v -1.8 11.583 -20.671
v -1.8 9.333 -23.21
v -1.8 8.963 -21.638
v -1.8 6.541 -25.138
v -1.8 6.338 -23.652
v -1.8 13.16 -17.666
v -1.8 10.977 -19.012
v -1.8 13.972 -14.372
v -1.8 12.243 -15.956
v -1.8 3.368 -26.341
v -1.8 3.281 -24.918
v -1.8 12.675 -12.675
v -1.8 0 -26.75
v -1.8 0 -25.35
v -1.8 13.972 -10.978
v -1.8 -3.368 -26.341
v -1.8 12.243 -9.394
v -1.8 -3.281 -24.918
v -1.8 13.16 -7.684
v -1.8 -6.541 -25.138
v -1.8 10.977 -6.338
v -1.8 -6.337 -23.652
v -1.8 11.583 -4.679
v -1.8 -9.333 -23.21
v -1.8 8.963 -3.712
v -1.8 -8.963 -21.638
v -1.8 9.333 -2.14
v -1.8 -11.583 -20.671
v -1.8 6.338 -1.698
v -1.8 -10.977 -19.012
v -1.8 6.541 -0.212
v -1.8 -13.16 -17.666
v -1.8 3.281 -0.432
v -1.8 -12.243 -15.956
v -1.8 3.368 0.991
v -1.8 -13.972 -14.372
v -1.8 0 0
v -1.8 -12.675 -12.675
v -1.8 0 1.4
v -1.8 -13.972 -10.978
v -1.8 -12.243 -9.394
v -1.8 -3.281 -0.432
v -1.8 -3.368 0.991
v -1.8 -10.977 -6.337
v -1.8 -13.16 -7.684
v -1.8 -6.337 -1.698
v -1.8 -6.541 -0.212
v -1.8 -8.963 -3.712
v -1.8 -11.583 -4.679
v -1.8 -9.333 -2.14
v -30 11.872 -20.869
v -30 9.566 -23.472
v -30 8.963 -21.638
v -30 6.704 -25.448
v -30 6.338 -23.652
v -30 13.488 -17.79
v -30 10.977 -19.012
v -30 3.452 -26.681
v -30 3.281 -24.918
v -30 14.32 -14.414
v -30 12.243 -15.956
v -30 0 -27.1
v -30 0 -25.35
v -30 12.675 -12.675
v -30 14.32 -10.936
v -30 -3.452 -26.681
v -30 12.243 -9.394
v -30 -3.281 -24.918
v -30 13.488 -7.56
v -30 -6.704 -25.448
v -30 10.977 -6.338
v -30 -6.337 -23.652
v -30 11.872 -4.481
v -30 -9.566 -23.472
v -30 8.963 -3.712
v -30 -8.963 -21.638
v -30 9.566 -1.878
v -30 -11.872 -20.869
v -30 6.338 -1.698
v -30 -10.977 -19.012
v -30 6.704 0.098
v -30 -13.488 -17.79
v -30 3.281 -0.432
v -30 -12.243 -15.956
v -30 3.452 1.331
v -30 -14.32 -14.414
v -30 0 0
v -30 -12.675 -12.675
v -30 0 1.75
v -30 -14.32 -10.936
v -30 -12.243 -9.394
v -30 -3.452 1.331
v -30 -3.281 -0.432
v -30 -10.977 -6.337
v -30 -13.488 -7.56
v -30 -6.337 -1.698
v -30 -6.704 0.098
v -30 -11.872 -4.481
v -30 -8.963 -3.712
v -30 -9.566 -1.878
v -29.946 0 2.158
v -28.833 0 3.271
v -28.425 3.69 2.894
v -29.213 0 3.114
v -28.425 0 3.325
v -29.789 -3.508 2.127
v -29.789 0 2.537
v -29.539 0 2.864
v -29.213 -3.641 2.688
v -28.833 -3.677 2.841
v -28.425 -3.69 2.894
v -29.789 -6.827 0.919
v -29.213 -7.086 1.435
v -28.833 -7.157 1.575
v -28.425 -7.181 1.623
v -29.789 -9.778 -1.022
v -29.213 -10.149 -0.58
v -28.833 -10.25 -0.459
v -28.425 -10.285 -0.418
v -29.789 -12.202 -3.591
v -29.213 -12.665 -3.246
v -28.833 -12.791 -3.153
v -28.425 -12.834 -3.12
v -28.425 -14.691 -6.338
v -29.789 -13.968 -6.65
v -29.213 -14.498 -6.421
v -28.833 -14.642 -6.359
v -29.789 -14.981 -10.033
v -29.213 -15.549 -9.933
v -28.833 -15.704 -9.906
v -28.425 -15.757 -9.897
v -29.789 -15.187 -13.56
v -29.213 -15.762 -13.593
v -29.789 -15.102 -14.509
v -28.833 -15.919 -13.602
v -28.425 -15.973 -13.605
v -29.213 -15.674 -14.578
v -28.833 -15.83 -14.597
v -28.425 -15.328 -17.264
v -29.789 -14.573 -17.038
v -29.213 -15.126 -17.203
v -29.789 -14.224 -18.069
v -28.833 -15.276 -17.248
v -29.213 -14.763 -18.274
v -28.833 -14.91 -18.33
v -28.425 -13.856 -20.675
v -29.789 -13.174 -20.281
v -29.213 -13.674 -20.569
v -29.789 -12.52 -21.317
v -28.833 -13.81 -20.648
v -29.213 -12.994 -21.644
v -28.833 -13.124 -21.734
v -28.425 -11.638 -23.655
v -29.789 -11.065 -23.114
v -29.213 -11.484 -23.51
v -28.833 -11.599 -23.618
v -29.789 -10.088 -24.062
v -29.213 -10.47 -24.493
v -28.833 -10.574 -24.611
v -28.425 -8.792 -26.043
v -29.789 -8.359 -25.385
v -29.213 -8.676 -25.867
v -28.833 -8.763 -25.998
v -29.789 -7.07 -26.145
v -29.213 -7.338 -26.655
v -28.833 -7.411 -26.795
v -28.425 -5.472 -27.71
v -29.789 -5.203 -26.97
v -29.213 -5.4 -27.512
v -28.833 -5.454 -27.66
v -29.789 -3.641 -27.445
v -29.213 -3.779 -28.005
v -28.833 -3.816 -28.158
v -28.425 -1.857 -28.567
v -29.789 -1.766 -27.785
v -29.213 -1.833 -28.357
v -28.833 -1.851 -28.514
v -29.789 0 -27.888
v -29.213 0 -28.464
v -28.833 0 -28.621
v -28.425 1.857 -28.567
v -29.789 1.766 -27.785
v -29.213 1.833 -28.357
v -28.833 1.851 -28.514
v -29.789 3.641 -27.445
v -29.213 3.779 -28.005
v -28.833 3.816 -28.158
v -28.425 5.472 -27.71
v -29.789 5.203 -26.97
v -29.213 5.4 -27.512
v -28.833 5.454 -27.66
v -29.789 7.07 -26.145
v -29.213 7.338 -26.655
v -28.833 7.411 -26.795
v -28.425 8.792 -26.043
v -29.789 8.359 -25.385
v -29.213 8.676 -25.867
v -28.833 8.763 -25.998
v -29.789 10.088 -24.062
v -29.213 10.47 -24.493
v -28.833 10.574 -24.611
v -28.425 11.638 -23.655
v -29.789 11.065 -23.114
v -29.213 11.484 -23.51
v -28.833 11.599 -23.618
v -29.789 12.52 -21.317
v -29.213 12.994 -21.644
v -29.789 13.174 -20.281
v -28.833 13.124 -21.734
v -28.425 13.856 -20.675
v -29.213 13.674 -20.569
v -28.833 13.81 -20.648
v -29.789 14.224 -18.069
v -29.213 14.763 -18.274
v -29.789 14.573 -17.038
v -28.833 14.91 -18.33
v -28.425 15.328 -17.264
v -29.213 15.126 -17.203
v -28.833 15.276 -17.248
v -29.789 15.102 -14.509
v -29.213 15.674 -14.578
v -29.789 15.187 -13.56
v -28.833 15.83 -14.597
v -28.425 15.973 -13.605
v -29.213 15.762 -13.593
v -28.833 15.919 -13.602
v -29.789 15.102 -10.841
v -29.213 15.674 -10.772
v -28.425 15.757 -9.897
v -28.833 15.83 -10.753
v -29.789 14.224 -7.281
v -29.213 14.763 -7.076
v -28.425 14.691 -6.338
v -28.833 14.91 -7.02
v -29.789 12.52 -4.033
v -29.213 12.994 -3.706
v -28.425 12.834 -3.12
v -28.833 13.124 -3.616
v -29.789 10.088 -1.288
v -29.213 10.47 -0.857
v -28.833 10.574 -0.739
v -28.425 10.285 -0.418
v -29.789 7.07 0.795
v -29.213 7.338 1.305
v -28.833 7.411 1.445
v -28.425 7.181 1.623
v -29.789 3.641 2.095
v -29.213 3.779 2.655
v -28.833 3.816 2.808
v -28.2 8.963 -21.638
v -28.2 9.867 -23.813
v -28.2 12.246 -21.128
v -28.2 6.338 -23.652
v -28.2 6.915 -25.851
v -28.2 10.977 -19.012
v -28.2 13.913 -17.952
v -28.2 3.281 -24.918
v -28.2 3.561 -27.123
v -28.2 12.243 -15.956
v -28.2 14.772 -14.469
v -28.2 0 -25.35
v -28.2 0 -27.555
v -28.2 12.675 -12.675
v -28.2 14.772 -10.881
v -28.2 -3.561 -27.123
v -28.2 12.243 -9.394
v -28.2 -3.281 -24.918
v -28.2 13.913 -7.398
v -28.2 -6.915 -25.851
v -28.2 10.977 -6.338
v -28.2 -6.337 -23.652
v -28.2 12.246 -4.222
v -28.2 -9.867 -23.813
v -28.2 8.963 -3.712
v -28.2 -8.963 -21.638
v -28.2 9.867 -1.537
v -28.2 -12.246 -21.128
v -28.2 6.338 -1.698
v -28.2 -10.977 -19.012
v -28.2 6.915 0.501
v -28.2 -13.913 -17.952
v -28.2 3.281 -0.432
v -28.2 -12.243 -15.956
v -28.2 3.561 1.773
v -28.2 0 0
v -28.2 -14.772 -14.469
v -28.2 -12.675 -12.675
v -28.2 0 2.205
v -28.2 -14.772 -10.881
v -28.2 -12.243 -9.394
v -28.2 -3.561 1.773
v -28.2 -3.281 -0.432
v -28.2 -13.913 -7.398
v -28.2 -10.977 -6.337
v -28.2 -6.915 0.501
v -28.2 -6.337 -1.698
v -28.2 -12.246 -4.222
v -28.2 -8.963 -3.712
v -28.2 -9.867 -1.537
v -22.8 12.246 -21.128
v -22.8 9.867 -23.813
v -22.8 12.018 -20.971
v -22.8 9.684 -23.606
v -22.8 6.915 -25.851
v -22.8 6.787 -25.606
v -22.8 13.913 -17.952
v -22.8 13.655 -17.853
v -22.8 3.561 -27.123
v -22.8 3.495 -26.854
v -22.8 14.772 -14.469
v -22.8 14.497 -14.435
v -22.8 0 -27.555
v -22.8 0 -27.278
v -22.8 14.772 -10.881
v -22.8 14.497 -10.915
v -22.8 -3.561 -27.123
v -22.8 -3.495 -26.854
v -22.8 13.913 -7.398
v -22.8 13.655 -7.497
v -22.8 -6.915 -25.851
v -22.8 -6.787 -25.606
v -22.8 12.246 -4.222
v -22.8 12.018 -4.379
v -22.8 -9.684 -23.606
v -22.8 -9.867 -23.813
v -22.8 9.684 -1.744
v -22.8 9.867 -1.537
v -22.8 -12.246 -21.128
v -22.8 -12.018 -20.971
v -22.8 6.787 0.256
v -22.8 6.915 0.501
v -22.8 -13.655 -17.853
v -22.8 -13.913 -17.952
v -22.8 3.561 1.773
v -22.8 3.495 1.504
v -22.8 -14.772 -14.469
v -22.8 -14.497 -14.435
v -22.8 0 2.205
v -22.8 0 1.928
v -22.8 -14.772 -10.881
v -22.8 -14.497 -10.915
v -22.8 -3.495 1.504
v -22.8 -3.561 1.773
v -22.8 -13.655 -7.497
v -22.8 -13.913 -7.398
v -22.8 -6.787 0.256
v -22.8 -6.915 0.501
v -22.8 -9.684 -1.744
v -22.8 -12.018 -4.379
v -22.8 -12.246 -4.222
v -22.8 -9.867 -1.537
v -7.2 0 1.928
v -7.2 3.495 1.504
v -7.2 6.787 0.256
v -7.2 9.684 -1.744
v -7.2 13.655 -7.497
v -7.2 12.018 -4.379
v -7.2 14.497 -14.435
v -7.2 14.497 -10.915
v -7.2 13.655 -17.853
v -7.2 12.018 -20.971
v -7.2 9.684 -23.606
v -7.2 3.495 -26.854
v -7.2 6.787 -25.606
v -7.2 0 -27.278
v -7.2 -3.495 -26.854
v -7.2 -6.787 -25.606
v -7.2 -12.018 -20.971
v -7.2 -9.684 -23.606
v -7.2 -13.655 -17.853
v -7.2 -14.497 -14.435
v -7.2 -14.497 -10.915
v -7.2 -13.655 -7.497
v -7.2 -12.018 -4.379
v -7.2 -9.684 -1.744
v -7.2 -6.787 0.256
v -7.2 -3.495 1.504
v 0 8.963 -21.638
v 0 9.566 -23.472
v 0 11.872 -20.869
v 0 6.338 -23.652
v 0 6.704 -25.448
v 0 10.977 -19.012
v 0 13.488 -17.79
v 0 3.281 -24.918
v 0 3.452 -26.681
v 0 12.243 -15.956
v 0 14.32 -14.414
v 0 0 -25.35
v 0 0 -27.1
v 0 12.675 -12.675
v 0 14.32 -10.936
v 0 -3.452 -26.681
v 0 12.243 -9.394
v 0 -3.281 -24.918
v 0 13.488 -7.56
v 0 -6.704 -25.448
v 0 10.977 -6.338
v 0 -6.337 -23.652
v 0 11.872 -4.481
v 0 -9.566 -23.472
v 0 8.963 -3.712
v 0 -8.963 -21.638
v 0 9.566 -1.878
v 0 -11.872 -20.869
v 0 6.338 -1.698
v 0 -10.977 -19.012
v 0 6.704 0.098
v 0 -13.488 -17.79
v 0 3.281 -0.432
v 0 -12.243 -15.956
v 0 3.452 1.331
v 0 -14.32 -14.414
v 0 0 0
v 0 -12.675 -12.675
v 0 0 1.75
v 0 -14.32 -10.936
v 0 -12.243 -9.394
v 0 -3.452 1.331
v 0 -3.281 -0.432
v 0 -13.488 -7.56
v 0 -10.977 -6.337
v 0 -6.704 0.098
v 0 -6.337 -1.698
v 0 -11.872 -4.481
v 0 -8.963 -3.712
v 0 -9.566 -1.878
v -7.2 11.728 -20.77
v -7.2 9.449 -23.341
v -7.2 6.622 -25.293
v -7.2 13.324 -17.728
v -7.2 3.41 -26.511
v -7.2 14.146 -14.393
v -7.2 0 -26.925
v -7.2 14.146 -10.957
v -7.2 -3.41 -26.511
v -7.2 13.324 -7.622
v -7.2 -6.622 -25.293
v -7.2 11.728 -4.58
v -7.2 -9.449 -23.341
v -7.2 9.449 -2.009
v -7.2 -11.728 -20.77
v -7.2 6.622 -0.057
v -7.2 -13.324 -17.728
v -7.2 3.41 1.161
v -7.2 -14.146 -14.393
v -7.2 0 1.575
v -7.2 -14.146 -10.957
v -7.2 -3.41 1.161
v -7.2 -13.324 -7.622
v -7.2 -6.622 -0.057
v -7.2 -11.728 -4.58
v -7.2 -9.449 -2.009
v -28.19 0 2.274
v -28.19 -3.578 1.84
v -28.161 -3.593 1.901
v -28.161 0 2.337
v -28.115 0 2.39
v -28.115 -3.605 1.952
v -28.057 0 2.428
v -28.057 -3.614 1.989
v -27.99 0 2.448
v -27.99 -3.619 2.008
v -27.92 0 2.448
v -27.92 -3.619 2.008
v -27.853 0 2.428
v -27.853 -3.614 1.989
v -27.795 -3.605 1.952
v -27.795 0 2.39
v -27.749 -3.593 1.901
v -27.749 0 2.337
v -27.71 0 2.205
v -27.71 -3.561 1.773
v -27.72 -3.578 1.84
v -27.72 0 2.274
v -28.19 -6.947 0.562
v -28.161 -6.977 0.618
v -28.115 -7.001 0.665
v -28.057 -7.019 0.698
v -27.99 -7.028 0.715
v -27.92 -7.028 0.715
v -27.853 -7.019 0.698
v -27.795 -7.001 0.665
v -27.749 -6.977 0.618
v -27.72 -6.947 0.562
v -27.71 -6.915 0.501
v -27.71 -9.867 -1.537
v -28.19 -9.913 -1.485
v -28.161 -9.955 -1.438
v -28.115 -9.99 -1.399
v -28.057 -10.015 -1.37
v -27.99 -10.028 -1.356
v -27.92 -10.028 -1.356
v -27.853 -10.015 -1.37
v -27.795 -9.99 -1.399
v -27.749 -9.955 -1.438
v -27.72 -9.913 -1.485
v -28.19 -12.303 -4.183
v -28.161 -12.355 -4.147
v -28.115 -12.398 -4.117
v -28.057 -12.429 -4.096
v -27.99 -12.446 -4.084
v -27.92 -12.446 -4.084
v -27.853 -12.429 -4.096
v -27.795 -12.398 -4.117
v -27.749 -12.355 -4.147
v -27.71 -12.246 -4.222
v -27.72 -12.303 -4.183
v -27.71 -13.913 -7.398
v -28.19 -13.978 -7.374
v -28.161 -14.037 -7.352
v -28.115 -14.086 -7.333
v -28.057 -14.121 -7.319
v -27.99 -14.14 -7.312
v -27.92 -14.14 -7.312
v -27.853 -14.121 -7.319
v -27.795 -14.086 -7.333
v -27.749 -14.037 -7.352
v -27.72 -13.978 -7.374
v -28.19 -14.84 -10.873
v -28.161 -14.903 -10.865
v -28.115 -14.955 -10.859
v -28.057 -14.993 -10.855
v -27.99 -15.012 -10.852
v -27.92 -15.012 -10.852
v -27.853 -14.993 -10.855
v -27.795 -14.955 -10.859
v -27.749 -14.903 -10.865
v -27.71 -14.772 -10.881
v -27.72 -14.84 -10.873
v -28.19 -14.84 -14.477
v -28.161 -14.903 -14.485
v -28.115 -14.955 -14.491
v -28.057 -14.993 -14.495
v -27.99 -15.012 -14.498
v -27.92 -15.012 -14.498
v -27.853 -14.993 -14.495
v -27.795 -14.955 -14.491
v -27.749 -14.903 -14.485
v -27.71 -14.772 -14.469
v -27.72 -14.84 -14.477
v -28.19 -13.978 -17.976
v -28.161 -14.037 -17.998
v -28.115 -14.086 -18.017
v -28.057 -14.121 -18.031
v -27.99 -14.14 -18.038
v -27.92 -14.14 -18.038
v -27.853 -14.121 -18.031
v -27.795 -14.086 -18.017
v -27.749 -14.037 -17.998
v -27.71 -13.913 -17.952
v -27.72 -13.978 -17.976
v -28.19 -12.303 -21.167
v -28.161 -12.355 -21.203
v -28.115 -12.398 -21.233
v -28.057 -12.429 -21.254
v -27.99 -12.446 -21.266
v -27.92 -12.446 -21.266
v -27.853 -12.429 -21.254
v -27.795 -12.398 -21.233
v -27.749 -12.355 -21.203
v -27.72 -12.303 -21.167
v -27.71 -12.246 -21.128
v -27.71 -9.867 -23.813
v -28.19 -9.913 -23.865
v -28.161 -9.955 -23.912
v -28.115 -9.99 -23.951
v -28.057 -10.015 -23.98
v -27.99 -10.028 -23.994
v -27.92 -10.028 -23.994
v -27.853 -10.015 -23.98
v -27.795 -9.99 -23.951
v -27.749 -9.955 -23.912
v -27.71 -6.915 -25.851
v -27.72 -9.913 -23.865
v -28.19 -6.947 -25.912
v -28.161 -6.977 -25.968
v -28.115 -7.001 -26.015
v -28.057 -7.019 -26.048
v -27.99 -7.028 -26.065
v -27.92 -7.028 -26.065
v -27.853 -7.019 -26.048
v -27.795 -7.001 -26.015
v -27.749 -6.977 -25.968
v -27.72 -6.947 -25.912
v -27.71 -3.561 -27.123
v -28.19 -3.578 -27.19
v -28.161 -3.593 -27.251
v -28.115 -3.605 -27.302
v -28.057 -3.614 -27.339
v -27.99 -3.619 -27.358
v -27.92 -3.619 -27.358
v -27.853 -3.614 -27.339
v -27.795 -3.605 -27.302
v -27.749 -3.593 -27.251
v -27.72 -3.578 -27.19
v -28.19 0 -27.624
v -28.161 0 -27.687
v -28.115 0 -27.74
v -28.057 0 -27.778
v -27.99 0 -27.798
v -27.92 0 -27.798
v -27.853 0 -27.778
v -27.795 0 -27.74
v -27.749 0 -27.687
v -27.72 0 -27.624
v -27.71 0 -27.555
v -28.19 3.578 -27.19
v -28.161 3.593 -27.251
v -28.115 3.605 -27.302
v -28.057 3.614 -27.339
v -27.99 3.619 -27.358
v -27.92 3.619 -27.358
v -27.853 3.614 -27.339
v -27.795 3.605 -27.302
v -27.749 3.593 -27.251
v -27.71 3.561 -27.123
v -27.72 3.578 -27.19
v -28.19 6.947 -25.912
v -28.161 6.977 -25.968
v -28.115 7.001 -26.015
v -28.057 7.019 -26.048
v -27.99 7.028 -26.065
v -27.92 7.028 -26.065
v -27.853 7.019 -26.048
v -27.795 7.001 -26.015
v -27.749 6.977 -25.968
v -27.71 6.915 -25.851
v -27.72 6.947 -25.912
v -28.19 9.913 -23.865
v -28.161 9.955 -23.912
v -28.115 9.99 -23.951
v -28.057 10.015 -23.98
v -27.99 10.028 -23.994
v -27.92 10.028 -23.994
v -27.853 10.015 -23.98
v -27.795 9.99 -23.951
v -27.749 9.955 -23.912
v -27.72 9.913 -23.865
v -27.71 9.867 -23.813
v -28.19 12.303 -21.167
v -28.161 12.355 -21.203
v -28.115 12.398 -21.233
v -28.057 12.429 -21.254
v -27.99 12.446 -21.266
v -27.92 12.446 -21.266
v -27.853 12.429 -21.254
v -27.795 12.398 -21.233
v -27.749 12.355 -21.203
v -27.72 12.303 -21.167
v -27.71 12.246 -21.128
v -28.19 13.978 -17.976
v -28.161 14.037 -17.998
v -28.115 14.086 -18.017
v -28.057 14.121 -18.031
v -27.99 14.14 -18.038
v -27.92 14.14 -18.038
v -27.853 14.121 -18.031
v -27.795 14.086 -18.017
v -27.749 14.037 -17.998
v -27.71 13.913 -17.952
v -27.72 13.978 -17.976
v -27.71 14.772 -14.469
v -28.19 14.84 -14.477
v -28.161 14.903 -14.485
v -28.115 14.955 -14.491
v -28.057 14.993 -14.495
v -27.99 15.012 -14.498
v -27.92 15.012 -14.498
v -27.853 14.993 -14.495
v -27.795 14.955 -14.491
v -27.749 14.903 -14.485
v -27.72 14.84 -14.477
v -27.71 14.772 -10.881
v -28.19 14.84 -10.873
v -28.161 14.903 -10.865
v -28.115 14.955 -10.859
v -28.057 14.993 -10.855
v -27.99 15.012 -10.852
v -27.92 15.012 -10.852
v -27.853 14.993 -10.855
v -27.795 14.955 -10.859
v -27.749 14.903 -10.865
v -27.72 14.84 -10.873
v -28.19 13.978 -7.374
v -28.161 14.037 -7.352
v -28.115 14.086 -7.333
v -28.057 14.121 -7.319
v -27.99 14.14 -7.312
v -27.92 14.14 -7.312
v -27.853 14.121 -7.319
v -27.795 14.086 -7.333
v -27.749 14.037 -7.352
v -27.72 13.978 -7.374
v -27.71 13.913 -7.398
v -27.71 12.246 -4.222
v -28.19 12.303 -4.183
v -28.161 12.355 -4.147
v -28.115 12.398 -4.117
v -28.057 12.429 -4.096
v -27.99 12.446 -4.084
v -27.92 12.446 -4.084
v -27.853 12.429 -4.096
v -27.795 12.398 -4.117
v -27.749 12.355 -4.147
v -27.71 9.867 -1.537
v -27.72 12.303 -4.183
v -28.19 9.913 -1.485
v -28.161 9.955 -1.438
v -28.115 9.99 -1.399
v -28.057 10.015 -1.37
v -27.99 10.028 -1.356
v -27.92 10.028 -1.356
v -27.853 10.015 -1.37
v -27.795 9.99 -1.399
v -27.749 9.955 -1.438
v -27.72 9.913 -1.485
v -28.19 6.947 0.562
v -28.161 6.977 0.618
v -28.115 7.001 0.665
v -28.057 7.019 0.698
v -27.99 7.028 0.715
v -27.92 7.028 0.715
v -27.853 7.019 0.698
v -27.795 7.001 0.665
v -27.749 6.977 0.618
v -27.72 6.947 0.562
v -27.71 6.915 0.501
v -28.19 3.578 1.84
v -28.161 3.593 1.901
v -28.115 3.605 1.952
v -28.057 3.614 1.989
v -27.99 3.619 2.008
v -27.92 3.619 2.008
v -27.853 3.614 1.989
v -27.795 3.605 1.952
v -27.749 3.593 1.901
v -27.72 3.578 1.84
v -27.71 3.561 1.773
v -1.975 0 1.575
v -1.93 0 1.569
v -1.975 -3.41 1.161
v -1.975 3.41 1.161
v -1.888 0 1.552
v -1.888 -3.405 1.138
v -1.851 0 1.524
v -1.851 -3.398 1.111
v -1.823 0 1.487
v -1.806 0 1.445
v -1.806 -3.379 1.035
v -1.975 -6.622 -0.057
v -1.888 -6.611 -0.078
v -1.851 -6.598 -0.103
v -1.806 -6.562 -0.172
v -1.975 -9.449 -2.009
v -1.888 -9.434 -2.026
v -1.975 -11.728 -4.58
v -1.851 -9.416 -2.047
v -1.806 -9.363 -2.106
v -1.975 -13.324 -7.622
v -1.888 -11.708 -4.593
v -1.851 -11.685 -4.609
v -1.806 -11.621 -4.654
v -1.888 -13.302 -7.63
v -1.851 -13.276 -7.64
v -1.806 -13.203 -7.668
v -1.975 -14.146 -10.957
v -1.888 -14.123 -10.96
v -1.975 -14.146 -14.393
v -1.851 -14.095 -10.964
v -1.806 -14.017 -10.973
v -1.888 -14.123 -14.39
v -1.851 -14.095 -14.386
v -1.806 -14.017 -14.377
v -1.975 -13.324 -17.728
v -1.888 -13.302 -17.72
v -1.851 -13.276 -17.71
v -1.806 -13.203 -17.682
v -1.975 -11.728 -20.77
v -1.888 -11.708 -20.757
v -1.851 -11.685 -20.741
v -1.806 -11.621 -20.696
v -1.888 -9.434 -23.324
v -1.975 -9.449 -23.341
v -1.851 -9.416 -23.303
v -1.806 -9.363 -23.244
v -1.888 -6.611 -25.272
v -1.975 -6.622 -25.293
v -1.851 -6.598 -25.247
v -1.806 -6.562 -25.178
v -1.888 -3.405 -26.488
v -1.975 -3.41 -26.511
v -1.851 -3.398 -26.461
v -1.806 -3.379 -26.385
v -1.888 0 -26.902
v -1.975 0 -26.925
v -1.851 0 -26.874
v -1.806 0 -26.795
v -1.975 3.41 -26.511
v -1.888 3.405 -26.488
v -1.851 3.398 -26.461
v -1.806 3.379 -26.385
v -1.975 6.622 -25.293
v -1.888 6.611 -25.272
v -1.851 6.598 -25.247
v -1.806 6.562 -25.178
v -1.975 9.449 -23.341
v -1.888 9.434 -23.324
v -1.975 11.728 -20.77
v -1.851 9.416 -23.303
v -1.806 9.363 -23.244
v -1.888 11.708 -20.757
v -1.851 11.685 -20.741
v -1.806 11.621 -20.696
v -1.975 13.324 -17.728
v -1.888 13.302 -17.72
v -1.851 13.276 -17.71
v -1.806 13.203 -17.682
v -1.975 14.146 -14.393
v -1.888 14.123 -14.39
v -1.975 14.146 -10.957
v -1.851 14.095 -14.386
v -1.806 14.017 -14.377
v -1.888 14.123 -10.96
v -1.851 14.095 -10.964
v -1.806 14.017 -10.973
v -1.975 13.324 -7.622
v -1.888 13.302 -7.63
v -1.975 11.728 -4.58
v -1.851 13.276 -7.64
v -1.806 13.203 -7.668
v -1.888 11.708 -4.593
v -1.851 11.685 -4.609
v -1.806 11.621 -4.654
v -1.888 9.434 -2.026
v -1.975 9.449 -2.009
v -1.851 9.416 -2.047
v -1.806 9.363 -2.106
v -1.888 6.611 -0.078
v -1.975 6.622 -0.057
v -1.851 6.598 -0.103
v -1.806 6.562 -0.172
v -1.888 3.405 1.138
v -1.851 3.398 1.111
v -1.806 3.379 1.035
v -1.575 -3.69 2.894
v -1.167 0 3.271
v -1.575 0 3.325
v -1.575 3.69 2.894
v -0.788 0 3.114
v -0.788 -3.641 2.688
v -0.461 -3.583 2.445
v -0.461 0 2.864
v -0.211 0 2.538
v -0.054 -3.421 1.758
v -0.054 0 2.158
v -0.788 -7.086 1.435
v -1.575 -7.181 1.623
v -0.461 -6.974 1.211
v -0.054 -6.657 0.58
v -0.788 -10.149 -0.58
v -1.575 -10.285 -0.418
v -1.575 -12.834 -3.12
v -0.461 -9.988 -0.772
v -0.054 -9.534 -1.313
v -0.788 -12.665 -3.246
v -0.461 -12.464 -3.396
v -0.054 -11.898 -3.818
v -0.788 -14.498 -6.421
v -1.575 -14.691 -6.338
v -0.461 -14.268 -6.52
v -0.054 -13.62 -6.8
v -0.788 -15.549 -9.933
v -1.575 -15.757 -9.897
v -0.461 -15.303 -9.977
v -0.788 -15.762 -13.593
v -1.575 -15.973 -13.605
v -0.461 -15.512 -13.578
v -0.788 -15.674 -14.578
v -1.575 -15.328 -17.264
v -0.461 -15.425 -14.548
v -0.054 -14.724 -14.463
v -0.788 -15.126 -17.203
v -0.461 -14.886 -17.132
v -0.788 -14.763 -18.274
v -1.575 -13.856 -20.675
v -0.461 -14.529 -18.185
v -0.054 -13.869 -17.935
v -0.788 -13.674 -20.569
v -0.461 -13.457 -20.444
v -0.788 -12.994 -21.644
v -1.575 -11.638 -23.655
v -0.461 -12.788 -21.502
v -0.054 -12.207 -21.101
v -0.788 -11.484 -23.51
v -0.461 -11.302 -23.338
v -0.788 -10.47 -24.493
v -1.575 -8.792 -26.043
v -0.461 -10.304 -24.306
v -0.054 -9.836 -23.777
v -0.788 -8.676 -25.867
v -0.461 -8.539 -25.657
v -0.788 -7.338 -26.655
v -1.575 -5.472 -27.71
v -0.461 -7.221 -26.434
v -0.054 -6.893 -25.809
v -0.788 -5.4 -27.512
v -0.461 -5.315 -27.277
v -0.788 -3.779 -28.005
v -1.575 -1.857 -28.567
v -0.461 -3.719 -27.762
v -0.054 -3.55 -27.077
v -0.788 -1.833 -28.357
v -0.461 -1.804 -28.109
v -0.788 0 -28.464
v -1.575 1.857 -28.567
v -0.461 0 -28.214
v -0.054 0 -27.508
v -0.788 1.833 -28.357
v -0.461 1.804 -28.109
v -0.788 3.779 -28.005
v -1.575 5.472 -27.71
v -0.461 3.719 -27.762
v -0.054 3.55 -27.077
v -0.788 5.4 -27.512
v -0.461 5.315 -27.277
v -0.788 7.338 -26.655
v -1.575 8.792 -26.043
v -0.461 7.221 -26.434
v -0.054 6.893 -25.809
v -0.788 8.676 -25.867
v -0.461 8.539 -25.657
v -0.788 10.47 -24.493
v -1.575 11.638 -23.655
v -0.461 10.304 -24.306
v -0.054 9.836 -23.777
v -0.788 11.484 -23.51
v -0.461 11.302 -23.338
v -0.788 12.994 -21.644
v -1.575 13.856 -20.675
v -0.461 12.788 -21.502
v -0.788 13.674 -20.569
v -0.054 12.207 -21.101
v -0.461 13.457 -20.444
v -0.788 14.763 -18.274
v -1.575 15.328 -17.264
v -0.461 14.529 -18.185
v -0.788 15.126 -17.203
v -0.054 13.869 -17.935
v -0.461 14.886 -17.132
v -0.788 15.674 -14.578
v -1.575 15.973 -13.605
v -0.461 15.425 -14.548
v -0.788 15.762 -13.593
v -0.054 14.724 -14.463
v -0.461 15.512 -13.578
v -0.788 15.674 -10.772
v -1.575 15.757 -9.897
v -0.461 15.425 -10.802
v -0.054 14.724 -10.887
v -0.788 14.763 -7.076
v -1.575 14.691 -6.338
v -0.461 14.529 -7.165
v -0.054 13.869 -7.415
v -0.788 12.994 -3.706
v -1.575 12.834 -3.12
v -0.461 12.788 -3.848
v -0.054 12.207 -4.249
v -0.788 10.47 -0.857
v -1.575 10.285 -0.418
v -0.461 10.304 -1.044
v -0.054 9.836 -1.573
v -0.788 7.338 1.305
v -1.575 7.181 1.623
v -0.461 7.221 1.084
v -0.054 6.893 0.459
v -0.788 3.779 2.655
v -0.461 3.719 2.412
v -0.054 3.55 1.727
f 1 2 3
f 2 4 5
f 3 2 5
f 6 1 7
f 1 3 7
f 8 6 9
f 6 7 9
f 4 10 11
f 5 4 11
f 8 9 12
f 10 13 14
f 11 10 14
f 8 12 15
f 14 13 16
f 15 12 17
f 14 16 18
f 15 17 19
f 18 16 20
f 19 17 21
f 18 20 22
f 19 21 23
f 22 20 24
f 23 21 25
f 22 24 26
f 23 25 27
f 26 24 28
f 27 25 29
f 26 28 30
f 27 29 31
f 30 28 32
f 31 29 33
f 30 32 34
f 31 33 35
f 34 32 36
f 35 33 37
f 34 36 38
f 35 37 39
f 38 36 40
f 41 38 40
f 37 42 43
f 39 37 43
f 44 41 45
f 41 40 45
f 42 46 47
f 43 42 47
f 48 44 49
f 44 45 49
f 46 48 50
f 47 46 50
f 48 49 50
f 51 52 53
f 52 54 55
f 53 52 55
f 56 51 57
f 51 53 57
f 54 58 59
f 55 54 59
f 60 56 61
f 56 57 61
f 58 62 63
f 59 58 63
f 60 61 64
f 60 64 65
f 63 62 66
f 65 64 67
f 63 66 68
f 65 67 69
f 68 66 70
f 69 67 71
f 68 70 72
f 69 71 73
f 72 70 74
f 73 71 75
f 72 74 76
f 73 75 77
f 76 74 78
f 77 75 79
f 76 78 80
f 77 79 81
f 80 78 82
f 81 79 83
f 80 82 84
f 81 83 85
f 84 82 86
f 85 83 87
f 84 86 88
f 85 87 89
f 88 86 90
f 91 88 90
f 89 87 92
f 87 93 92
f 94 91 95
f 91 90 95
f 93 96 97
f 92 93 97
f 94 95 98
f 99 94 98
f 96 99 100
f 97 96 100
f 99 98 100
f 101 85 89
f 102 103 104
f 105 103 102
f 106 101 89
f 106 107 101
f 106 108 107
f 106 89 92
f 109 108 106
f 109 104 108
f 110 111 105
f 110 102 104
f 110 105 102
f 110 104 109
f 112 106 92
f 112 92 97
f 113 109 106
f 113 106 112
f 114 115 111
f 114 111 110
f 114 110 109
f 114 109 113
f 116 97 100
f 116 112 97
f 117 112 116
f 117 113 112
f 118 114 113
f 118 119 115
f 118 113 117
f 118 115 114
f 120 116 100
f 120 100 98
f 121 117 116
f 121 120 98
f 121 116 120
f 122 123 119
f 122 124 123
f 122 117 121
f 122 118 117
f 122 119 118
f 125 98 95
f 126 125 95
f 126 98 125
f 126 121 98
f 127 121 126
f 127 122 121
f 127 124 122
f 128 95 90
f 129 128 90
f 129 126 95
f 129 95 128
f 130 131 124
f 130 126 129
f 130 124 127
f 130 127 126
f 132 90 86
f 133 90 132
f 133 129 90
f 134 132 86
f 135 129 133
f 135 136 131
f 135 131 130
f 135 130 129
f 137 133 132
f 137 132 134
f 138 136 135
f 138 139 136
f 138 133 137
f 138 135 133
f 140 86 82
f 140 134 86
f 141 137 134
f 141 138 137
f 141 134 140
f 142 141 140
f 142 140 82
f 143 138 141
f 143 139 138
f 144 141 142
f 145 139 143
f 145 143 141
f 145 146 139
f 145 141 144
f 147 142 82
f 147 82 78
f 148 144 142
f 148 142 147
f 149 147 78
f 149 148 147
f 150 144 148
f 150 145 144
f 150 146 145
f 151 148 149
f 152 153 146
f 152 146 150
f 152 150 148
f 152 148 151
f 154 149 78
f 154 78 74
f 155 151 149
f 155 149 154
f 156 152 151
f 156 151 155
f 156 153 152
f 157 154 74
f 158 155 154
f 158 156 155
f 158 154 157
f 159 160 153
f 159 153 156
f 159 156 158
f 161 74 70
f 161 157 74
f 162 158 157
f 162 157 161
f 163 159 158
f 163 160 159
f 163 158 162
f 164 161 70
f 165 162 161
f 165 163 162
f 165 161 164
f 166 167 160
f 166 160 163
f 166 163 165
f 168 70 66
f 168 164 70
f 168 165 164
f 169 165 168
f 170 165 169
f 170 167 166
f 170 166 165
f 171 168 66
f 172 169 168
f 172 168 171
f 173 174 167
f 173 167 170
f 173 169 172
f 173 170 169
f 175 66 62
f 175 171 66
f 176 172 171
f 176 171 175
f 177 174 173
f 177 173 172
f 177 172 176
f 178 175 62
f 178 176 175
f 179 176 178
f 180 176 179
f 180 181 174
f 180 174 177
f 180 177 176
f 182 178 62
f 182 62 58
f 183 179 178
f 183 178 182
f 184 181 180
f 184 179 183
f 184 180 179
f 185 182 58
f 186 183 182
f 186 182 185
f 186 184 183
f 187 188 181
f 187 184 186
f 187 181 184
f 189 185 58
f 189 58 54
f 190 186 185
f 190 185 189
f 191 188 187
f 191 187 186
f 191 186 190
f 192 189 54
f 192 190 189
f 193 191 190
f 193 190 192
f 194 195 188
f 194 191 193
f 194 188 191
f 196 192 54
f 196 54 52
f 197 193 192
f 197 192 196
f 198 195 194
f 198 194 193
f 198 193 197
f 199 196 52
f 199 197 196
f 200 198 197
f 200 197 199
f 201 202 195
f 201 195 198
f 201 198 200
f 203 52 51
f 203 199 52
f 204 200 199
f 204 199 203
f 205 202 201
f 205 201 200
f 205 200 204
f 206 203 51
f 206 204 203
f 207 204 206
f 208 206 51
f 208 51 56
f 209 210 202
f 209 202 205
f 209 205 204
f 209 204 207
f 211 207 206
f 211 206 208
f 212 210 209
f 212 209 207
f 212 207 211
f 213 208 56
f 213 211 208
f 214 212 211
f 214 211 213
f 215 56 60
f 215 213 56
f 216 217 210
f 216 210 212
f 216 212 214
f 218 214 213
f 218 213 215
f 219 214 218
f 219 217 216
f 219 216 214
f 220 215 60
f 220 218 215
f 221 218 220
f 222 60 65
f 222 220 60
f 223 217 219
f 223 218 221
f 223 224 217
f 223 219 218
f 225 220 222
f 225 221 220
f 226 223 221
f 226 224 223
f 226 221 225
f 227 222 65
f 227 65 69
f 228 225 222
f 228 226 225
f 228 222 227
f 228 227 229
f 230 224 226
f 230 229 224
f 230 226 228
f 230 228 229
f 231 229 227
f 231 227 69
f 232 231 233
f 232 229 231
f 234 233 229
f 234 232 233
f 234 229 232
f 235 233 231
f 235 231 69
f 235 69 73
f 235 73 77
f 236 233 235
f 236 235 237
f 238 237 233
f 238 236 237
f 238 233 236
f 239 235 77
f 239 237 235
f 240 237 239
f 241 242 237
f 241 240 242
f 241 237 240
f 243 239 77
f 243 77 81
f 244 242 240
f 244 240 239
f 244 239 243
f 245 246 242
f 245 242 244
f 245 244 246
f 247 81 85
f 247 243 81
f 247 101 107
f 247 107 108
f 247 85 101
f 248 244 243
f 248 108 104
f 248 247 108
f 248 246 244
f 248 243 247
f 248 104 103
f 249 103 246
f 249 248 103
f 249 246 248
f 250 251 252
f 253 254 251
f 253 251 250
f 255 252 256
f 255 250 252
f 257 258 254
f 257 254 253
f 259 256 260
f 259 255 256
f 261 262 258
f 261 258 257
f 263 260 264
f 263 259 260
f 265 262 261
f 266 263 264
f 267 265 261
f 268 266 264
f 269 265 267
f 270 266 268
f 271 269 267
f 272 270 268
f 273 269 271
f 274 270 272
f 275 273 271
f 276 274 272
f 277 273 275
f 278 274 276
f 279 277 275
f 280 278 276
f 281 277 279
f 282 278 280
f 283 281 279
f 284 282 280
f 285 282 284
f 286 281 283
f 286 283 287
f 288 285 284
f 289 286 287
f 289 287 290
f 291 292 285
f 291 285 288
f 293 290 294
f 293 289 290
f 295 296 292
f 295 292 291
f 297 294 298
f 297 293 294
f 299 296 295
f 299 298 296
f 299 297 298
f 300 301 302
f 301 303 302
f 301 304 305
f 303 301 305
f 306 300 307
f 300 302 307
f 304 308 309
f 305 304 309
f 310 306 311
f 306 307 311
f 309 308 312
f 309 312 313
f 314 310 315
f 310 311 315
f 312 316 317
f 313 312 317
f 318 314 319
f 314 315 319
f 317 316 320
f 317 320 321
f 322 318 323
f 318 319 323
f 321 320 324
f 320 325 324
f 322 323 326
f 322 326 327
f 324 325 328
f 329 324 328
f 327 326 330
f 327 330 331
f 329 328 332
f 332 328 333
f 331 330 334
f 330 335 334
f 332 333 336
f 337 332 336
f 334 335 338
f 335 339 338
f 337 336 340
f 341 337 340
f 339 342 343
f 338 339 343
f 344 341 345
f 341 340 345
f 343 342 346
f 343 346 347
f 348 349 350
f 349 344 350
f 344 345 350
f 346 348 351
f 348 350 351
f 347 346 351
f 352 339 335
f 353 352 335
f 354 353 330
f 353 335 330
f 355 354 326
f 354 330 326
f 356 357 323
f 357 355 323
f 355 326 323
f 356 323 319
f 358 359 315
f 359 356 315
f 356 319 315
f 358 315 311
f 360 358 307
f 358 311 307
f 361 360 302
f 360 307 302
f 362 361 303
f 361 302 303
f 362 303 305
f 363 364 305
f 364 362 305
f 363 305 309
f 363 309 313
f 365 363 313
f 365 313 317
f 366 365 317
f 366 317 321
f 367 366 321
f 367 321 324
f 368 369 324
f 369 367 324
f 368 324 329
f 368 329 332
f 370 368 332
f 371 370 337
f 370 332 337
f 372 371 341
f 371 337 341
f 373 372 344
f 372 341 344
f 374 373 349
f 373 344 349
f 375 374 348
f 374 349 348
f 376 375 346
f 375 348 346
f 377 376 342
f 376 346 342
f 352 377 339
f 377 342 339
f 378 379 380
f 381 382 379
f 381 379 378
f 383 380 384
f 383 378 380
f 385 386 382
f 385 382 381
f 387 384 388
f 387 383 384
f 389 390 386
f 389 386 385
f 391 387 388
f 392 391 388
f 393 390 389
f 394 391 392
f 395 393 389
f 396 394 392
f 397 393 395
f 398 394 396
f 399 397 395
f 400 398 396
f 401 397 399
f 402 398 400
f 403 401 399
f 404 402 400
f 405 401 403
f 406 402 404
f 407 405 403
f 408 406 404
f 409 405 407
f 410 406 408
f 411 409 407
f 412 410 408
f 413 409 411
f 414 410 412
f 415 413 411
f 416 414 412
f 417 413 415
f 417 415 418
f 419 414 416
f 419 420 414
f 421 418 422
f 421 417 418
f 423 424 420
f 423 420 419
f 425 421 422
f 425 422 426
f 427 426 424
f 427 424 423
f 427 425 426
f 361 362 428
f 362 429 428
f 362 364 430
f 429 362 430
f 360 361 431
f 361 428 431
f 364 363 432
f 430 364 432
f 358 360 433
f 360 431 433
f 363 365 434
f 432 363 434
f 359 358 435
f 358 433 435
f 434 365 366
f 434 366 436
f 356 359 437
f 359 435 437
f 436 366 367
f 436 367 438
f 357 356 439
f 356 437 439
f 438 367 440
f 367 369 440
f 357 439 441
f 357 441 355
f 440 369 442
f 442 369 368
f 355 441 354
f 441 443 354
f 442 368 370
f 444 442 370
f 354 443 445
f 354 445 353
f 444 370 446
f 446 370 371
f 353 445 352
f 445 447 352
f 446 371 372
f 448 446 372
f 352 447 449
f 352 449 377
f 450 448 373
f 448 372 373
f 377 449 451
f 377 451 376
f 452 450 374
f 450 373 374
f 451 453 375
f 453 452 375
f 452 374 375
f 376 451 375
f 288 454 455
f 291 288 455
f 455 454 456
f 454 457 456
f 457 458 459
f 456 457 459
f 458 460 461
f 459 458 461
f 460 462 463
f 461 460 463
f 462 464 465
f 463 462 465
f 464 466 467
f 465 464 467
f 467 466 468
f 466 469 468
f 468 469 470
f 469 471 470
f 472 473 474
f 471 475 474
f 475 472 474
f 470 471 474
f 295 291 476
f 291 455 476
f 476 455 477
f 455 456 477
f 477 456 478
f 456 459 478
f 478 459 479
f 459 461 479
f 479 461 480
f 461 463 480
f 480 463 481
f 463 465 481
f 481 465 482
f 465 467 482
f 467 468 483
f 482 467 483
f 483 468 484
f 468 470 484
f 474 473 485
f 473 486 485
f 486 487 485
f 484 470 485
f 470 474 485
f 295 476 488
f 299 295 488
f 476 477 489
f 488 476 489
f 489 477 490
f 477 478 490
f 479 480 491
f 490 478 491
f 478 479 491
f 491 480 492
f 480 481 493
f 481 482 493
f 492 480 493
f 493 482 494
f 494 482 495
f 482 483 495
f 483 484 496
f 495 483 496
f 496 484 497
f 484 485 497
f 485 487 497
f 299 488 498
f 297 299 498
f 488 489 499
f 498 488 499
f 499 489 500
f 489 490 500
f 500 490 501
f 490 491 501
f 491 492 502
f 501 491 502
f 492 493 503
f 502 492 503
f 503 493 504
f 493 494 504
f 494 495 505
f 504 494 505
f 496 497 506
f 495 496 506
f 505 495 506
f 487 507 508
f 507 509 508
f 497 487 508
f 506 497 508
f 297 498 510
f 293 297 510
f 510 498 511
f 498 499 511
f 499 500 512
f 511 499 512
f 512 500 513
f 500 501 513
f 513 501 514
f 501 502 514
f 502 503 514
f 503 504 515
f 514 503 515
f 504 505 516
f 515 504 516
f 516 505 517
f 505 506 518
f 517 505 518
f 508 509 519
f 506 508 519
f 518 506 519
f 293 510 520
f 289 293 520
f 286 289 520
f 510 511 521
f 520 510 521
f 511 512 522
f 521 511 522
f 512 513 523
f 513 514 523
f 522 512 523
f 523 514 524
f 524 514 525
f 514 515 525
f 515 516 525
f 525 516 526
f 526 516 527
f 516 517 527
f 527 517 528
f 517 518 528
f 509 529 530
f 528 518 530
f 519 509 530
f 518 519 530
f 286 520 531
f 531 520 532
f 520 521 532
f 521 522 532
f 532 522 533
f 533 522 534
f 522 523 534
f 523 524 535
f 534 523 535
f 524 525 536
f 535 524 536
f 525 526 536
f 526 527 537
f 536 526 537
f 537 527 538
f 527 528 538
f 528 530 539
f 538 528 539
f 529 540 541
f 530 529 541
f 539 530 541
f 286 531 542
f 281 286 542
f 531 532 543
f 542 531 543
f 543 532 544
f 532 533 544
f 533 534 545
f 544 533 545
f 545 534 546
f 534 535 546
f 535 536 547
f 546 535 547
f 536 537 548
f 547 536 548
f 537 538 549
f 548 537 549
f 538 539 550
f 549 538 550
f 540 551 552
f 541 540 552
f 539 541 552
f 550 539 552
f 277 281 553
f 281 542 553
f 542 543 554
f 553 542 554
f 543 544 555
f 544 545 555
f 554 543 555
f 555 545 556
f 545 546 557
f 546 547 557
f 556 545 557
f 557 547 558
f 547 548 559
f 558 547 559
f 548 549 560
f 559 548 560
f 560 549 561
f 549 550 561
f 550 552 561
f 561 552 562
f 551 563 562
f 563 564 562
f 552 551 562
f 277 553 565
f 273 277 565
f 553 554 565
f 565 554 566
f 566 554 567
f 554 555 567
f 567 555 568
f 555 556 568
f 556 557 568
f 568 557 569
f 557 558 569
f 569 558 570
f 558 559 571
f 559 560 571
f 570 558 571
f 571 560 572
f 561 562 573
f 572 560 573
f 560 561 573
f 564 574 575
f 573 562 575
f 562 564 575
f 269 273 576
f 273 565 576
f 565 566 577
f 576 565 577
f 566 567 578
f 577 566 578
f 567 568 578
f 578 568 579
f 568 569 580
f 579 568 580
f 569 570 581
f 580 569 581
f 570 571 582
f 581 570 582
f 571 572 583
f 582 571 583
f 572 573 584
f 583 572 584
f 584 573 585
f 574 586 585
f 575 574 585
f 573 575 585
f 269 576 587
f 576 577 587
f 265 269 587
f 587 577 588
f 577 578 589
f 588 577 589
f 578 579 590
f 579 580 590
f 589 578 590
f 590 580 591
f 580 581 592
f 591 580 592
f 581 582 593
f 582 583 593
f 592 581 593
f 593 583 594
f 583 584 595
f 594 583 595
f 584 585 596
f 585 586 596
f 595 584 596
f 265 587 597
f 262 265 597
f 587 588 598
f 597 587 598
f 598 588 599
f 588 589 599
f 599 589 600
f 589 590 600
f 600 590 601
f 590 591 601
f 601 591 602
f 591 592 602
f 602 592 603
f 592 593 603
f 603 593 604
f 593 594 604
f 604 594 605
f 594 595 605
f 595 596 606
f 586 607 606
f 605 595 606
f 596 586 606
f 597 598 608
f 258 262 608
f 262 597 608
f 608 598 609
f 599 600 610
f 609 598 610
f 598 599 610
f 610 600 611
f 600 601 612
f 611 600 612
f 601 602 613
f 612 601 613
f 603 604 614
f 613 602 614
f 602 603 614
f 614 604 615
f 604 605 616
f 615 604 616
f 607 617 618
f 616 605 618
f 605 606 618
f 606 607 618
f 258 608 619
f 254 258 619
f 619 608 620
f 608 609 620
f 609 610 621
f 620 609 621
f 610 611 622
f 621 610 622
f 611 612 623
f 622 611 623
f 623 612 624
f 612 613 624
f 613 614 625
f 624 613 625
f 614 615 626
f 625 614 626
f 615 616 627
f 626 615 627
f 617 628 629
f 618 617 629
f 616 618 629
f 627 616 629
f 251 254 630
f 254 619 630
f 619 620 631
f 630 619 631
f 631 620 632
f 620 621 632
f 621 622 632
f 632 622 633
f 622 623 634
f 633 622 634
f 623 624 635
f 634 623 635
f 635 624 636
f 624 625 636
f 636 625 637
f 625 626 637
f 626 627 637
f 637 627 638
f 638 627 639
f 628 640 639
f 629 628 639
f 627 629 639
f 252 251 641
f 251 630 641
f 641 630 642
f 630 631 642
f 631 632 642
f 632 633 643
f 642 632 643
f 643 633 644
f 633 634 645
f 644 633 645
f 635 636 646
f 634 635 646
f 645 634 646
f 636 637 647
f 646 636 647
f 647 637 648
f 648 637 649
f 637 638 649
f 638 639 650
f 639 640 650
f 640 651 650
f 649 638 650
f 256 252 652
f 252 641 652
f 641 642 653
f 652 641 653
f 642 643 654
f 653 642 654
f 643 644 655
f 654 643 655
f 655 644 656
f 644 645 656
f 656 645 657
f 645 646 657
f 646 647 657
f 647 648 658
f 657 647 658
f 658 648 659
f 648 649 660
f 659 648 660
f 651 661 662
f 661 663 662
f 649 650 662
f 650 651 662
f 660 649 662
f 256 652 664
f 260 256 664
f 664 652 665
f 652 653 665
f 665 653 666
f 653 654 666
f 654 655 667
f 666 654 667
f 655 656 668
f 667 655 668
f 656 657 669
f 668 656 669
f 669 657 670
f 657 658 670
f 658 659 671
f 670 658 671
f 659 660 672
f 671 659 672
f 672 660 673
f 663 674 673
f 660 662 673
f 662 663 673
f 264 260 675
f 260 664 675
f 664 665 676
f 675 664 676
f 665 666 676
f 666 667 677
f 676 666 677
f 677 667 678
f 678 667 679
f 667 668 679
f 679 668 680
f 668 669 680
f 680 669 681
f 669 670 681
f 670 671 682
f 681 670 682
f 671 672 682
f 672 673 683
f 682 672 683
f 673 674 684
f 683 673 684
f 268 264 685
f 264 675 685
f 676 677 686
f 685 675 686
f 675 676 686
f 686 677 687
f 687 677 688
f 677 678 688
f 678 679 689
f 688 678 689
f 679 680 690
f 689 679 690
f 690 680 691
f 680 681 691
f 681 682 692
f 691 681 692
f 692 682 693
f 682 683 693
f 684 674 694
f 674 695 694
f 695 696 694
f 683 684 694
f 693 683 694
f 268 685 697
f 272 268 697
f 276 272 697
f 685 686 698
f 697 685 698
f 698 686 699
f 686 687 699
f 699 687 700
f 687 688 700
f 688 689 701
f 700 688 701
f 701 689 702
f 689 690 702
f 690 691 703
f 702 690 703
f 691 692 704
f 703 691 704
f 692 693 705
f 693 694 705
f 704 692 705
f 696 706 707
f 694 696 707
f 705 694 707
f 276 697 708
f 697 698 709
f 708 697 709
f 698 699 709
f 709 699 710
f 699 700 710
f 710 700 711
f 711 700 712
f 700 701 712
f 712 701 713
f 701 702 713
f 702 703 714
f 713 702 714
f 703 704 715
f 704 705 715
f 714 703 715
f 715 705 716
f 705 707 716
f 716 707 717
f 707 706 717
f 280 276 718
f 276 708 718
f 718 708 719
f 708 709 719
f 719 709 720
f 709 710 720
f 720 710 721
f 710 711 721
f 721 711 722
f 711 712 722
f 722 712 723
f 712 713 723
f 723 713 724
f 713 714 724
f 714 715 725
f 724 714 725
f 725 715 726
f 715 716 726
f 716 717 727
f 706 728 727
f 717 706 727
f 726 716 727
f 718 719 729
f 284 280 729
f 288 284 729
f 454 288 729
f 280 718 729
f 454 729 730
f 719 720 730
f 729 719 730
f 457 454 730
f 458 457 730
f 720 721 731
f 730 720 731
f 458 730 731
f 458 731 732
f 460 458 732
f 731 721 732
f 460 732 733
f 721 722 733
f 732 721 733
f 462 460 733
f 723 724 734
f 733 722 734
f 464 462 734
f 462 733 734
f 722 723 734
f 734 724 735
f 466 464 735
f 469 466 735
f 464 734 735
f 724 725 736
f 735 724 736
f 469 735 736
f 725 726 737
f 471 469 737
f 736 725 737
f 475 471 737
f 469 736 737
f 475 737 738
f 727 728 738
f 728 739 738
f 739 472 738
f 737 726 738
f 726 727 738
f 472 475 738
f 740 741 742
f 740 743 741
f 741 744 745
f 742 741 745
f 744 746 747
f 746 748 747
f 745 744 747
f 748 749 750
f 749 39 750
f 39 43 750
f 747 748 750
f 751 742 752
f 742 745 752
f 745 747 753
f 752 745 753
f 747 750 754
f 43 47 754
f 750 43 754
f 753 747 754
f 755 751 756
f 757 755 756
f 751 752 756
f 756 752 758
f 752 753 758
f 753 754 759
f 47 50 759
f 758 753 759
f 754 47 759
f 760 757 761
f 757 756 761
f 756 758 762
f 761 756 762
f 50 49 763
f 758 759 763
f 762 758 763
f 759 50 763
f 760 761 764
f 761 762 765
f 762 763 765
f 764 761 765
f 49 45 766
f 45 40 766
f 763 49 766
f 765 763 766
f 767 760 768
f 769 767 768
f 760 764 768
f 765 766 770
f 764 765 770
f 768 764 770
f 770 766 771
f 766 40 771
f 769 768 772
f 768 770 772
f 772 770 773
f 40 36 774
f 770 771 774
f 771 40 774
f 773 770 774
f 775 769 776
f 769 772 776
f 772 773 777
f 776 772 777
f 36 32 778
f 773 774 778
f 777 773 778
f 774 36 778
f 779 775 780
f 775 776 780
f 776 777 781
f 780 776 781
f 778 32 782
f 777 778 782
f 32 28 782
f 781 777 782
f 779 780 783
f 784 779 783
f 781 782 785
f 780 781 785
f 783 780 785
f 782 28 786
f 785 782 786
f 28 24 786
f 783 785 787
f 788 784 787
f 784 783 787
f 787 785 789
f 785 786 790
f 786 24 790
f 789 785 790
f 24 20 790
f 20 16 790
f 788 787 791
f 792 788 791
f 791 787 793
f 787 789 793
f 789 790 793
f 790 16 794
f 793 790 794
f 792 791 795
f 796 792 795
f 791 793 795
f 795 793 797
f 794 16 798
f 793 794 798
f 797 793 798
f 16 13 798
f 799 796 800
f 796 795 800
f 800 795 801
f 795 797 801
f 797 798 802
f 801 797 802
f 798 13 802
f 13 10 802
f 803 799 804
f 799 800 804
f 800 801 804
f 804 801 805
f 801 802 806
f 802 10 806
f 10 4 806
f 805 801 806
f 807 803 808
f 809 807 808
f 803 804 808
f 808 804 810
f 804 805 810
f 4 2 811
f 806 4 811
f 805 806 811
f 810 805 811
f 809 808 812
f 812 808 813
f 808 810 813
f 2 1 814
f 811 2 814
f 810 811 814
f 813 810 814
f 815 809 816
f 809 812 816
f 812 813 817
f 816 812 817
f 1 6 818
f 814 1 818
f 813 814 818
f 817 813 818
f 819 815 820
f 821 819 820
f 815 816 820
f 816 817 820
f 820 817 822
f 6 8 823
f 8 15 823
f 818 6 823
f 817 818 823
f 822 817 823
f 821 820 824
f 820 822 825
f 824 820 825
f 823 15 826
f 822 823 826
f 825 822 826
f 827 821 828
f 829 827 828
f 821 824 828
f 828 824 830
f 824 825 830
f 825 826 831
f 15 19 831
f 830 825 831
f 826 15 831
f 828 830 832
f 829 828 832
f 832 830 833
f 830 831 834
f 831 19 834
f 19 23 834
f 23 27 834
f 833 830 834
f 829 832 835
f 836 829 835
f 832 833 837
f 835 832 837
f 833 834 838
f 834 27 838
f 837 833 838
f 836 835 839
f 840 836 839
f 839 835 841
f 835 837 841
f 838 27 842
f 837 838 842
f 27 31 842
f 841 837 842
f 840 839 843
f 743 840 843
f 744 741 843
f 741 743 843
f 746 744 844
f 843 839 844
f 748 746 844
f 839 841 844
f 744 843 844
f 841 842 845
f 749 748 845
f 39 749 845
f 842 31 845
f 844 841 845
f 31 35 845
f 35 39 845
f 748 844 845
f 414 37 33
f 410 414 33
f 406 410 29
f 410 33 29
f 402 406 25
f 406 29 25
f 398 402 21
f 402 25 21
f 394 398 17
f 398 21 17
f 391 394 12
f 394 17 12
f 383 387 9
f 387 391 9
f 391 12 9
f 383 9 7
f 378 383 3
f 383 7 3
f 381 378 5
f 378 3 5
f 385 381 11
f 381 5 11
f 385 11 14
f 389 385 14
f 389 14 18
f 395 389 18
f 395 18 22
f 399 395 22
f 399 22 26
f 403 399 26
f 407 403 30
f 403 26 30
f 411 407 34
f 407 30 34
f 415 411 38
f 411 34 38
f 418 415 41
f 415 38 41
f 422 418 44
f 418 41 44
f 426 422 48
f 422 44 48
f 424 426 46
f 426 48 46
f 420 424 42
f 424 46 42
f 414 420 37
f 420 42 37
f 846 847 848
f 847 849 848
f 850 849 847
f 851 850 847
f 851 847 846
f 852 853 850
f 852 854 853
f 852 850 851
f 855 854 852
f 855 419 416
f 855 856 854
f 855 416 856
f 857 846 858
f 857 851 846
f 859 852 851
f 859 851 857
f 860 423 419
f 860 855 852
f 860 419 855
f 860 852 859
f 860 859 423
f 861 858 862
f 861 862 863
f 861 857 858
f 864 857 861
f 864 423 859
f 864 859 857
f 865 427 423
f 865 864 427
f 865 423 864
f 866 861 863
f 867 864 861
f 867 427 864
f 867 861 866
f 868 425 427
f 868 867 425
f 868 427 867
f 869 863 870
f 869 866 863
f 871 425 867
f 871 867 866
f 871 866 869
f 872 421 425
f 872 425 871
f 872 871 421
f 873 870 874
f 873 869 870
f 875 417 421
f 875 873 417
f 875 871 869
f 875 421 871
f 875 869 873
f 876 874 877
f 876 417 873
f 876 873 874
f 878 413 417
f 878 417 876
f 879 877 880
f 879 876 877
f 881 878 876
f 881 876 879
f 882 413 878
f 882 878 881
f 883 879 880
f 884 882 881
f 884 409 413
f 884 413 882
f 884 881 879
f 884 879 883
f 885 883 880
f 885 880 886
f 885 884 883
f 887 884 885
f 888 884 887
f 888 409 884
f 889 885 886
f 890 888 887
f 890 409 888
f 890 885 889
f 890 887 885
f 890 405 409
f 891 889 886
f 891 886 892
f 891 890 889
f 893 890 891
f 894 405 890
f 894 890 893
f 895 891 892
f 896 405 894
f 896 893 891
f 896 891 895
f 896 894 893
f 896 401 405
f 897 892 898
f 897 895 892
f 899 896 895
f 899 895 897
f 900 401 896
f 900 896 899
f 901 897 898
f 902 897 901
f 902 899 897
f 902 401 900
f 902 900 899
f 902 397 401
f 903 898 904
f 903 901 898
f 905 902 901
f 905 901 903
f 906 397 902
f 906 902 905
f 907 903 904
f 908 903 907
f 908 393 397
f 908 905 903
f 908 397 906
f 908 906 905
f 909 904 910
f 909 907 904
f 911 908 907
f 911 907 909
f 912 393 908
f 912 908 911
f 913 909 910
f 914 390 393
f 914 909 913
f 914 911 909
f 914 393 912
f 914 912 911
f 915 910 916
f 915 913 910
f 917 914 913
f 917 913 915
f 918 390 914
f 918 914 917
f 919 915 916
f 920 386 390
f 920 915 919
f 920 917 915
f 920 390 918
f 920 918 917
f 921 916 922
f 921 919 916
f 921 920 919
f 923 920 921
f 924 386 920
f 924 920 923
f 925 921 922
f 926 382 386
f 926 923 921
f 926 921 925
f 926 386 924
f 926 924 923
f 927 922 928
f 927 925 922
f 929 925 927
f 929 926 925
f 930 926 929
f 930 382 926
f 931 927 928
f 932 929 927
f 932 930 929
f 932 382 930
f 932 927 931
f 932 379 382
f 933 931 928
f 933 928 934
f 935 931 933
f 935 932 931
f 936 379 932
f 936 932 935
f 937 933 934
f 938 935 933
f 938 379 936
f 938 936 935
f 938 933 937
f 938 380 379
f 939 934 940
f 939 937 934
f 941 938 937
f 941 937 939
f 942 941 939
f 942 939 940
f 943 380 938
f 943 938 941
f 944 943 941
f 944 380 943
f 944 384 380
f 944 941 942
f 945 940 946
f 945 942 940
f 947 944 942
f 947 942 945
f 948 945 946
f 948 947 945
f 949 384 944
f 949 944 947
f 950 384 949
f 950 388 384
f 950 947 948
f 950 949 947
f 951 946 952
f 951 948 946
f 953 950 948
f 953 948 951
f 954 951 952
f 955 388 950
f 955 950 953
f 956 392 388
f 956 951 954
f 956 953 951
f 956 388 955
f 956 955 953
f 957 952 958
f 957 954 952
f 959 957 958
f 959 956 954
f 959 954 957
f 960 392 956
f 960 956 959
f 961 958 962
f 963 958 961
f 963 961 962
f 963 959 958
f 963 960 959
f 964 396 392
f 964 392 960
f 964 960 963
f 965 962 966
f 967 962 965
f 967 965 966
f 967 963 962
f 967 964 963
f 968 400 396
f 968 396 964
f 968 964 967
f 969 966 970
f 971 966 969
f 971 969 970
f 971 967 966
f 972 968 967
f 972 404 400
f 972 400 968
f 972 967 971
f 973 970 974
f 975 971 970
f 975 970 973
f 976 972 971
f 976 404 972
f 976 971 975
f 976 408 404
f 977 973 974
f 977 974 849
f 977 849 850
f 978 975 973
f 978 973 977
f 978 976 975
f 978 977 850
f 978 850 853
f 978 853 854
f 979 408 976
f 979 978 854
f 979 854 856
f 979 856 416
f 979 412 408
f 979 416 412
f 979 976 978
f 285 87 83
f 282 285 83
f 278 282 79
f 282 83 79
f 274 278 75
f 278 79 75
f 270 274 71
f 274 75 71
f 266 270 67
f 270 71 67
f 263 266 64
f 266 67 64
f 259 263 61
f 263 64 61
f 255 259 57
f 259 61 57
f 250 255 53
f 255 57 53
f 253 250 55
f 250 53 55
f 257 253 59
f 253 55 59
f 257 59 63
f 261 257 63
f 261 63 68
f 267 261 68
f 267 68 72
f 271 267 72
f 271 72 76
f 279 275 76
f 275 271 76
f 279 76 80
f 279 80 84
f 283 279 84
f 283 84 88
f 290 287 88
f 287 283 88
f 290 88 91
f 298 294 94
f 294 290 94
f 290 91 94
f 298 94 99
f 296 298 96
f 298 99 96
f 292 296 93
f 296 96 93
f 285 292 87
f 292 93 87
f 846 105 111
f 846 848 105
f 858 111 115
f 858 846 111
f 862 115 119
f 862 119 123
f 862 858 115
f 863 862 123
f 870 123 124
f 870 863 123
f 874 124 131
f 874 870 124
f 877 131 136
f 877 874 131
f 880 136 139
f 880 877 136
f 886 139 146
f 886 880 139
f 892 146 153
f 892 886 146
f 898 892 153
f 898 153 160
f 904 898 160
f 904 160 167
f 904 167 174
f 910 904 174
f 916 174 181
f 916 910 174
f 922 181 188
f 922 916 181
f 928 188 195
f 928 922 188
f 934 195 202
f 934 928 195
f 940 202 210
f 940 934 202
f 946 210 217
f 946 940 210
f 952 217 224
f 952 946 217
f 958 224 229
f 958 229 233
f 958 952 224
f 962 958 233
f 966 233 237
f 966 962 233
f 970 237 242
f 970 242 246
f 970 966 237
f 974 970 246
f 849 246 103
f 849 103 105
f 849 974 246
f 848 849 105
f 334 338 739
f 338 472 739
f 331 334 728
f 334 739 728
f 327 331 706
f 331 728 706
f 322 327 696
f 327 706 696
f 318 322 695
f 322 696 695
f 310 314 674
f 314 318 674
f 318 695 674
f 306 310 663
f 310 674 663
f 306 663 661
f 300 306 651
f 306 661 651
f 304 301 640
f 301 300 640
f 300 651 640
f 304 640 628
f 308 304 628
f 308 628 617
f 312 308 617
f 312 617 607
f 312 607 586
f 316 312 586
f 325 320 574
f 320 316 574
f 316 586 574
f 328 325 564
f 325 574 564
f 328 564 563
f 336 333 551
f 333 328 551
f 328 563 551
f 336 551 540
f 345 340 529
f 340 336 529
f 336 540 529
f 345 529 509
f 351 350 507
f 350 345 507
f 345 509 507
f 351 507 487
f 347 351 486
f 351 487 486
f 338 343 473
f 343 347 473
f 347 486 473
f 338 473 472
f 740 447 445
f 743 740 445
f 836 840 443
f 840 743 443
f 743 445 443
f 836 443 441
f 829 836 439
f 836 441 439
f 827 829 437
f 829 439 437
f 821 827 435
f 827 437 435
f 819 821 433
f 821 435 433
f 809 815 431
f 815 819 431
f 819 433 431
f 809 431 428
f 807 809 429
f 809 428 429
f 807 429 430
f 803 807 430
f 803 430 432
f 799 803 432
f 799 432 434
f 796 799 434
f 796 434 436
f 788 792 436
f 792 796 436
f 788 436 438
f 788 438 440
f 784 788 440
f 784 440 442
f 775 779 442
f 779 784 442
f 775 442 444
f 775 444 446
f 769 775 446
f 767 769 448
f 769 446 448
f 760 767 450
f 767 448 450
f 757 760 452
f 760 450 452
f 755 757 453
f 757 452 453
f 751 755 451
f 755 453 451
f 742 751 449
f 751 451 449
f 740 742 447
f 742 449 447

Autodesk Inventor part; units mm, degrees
ref_plane "YZ Plane" through (0, 0, 0) normal (1, 0, 0) x (0, 1, 0)
ref_plane "XZ Plane" through (0, 0, 0) normal (0, 1, 0) x (-1, 0, 0)
ref_plane "XY Plane" through (0, 0, 0) normal (0, 0, 1) x (1, 0, 0)
sketch "Sketch1" plane through (0, 0, 0) normal (0, 1, 0) x (-1, 0, 0)
  line L0 (1.975, 1.575) -> (7.2, 1.575)
  line L1 (1.8, 0) -> (1.8, 1.4)
  line L2 (0, 0) -> (1.8, 0)
  line L3 (0, 1.75) -> (0, 0)
  line L4 (28.425, 3.325) -> (1.575, 3.325)
  line L5 (30, 0) -> (30, 1.75)
  line L6 (28.2, 0) -> (30, 0)
  line L7 (28.2, 2.205) -> (28.2, 0)
  line L8 (22.8, 2.205) -> (27.71, 2.205)
  line L9 (22.8, 1.9285) -> (22.8, 2.205)
  line L10 (7.2, 1.9285) -> (22.8, 1.9285)
  line L11 (7.2, 1.575) -> (7.2, 1.9285)
  arc A0 (1.975, 1.575) -> (1.8, 1.4) centre (1.975, 1.4) ccw
  arc A1 (1.575, 3.325) -> (0, 1.75) centre (1.575, 1.75) ccw
  arc A2 (30, 1.75) -> (28.425, 3.325) centre (28.425, 1.75) ccw
  arc A3 (28.2, 2.205) -> (27.71, 2.205) centre (27.955, 2.205) ccw
  line L12 (30, -12.675) -> (0.4613, -12.675) construction
  point P0 (30, 0.875)
  dimension "d0" = 0
  dimension "d1" = 1.8
  dimension "d2" = 1.75
  dimension "d3" = 3.325
  dimension "d4" = 1.575
  dimension "d5" = 1.4
  dimension "d6" = 0.175
  dimension "d7" = 30
  dimension "d8" = 26.85
  dimension "d9" = 1.75
  dimension "d10" = 1.8
  dimension "d11" = 0.245
  dimension "d12" = 4.91
  dimension "d13" = 15.6
  dimension "d14" = 5.225
  dimension "d15" = 0.3535
  dimension "d16" = 0.2765
  dimension "d17" = 2.205
  dimension "d18" = 1.575
  dimension "d19" = 12.675
revolve "Revolution1" add sketch "Sketch1" angle 360 about axis through (-30, 0, -12.675) along (1, 0, 0)
properties part number "HFL2530_OutRing"
